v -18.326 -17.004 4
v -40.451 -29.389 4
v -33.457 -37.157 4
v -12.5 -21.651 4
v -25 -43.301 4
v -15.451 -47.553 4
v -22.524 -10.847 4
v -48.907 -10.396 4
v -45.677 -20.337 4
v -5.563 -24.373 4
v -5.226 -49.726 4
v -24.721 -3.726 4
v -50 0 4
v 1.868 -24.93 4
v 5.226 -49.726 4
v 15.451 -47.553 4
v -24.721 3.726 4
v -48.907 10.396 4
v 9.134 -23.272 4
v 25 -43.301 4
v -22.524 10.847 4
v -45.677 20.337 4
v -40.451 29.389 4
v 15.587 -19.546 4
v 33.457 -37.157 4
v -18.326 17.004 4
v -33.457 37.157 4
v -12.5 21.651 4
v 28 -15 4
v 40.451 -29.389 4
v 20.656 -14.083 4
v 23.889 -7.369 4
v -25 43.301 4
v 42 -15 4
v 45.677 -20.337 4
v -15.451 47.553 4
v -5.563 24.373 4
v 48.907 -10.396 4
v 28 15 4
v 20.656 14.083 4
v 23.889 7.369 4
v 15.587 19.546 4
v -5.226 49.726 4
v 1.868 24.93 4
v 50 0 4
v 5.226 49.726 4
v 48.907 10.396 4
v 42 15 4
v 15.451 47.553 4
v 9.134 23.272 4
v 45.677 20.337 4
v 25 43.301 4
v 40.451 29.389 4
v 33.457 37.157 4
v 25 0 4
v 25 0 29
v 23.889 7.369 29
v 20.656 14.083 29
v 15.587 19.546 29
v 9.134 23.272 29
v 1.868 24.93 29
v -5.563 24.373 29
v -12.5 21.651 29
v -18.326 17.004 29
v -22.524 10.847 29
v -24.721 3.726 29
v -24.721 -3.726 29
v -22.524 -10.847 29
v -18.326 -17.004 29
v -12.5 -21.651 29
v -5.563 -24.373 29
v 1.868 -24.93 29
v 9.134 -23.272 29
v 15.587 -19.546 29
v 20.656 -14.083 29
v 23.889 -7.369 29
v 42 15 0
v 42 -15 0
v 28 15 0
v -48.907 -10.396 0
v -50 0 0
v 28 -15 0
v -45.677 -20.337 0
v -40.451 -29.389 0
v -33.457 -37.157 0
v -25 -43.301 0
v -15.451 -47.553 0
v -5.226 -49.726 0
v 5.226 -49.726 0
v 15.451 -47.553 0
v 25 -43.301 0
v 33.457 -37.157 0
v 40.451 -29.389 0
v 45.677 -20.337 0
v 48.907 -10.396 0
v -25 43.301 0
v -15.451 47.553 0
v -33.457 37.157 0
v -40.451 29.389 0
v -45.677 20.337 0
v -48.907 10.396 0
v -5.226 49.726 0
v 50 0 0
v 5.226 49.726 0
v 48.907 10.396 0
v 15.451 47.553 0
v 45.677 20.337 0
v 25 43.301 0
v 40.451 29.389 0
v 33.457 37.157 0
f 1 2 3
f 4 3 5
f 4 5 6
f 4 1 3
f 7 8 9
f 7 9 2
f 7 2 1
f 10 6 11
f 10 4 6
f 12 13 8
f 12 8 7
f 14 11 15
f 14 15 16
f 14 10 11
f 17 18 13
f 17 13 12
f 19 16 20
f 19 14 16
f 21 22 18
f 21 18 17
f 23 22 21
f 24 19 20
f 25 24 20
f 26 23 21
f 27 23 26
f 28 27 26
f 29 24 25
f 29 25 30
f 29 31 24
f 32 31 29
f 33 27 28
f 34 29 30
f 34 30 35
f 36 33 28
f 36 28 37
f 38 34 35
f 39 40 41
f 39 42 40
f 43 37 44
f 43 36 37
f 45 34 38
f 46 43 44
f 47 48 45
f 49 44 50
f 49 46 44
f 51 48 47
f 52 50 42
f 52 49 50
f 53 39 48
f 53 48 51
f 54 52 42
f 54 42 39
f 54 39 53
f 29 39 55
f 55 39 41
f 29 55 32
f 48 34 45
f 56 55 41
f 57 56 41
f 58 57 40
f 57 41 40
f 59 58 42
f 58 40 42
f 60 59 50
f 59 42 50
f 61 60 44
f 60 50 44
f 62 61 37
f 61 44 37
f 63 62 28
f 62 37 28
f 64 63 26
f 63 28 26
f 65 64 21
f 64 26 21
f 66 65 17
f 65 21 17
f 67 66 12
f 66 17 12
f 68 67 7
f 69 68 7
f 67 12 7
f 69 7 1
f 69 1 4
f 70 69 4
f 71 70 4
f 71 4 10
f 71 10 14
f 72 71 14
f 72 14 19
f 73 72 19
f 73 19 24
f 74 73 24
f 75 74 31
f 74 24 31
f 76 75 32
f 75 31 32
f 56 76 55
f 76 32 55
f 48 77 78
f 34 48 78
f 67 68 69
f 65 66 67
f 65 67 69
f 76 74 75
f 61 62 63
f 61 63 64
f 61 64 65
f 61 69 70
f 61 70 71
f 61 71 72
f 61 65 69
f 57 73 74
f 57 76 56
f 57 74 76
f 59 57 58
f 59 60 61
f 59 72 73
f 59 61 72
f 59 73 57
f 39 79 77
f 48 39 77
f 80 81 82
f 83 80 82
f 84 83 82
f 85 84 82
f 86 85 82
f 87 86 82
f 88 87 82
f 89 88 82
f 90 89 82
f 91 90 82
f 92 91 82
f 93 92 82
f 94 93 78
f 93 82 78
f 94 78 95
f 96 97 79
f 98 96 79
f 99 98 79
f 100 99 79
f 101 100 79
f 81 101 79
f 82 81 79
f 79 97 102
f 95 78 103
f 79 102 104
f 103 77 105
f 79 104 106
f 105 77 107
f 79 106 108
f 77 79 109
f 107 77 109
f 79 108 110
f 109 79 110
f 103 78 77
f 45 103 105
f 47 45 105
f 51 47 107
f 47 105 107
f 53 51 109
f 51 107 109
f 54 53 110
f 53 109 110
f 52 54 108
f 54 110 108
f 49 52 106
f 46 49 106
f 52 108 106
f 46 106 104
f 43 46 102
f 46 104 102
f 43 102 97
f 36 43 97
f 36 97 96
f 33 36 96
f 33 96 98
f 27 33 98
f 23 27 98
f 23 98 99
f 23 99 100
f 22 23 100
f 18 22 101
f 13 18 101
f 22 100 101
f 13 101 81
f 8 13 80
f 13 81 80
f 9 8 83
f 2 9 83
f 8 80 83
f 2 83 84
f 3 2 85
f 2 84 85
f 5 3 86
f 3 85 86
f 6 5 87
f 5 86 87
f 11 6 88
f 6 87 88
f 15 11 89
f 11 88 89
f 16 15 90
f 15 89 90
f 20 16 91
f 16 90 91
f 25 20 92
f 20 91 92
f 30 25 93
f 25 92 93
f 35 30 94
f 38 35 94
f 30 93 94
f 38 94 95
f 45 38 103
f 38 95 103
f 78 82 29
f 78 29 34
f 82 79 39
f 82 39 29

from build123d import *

# Parameters (mm, degrees)
F0_R     = 50
F1_DEPTH = 4
F2_R     = 25
F3_DEPTH = 25
F4_W     = 14
F4_H     = 30
F5_DEPTH = 5


with BuildPart() as f1:
    # F0 (on Top) → F1 (new body)
    with BuildSketch(Plane.XY):
        Circle(F0_R)
    extrude(amount=F1_DEPTH)

    # F2 (on face) → F3 (join)
    with BuildSketch(Plane.XY.offset(4)):
        Circle(F2_R)
    extrude(amount=F3_DEPTH)

    # F4 (on face) → F5 (cut)
    with BuildSketch(Plane(origin=(0, 0, 0), x_dir=(1, 0, 0), z_dir=(0, 0, -1))):
        with Locations((35, 0)):
            Rectangle(F4_W, F4_H)
    extrude(amount=-F5_DEPTH, mode=Mode.SUBTRACT)


solid = f1.part
